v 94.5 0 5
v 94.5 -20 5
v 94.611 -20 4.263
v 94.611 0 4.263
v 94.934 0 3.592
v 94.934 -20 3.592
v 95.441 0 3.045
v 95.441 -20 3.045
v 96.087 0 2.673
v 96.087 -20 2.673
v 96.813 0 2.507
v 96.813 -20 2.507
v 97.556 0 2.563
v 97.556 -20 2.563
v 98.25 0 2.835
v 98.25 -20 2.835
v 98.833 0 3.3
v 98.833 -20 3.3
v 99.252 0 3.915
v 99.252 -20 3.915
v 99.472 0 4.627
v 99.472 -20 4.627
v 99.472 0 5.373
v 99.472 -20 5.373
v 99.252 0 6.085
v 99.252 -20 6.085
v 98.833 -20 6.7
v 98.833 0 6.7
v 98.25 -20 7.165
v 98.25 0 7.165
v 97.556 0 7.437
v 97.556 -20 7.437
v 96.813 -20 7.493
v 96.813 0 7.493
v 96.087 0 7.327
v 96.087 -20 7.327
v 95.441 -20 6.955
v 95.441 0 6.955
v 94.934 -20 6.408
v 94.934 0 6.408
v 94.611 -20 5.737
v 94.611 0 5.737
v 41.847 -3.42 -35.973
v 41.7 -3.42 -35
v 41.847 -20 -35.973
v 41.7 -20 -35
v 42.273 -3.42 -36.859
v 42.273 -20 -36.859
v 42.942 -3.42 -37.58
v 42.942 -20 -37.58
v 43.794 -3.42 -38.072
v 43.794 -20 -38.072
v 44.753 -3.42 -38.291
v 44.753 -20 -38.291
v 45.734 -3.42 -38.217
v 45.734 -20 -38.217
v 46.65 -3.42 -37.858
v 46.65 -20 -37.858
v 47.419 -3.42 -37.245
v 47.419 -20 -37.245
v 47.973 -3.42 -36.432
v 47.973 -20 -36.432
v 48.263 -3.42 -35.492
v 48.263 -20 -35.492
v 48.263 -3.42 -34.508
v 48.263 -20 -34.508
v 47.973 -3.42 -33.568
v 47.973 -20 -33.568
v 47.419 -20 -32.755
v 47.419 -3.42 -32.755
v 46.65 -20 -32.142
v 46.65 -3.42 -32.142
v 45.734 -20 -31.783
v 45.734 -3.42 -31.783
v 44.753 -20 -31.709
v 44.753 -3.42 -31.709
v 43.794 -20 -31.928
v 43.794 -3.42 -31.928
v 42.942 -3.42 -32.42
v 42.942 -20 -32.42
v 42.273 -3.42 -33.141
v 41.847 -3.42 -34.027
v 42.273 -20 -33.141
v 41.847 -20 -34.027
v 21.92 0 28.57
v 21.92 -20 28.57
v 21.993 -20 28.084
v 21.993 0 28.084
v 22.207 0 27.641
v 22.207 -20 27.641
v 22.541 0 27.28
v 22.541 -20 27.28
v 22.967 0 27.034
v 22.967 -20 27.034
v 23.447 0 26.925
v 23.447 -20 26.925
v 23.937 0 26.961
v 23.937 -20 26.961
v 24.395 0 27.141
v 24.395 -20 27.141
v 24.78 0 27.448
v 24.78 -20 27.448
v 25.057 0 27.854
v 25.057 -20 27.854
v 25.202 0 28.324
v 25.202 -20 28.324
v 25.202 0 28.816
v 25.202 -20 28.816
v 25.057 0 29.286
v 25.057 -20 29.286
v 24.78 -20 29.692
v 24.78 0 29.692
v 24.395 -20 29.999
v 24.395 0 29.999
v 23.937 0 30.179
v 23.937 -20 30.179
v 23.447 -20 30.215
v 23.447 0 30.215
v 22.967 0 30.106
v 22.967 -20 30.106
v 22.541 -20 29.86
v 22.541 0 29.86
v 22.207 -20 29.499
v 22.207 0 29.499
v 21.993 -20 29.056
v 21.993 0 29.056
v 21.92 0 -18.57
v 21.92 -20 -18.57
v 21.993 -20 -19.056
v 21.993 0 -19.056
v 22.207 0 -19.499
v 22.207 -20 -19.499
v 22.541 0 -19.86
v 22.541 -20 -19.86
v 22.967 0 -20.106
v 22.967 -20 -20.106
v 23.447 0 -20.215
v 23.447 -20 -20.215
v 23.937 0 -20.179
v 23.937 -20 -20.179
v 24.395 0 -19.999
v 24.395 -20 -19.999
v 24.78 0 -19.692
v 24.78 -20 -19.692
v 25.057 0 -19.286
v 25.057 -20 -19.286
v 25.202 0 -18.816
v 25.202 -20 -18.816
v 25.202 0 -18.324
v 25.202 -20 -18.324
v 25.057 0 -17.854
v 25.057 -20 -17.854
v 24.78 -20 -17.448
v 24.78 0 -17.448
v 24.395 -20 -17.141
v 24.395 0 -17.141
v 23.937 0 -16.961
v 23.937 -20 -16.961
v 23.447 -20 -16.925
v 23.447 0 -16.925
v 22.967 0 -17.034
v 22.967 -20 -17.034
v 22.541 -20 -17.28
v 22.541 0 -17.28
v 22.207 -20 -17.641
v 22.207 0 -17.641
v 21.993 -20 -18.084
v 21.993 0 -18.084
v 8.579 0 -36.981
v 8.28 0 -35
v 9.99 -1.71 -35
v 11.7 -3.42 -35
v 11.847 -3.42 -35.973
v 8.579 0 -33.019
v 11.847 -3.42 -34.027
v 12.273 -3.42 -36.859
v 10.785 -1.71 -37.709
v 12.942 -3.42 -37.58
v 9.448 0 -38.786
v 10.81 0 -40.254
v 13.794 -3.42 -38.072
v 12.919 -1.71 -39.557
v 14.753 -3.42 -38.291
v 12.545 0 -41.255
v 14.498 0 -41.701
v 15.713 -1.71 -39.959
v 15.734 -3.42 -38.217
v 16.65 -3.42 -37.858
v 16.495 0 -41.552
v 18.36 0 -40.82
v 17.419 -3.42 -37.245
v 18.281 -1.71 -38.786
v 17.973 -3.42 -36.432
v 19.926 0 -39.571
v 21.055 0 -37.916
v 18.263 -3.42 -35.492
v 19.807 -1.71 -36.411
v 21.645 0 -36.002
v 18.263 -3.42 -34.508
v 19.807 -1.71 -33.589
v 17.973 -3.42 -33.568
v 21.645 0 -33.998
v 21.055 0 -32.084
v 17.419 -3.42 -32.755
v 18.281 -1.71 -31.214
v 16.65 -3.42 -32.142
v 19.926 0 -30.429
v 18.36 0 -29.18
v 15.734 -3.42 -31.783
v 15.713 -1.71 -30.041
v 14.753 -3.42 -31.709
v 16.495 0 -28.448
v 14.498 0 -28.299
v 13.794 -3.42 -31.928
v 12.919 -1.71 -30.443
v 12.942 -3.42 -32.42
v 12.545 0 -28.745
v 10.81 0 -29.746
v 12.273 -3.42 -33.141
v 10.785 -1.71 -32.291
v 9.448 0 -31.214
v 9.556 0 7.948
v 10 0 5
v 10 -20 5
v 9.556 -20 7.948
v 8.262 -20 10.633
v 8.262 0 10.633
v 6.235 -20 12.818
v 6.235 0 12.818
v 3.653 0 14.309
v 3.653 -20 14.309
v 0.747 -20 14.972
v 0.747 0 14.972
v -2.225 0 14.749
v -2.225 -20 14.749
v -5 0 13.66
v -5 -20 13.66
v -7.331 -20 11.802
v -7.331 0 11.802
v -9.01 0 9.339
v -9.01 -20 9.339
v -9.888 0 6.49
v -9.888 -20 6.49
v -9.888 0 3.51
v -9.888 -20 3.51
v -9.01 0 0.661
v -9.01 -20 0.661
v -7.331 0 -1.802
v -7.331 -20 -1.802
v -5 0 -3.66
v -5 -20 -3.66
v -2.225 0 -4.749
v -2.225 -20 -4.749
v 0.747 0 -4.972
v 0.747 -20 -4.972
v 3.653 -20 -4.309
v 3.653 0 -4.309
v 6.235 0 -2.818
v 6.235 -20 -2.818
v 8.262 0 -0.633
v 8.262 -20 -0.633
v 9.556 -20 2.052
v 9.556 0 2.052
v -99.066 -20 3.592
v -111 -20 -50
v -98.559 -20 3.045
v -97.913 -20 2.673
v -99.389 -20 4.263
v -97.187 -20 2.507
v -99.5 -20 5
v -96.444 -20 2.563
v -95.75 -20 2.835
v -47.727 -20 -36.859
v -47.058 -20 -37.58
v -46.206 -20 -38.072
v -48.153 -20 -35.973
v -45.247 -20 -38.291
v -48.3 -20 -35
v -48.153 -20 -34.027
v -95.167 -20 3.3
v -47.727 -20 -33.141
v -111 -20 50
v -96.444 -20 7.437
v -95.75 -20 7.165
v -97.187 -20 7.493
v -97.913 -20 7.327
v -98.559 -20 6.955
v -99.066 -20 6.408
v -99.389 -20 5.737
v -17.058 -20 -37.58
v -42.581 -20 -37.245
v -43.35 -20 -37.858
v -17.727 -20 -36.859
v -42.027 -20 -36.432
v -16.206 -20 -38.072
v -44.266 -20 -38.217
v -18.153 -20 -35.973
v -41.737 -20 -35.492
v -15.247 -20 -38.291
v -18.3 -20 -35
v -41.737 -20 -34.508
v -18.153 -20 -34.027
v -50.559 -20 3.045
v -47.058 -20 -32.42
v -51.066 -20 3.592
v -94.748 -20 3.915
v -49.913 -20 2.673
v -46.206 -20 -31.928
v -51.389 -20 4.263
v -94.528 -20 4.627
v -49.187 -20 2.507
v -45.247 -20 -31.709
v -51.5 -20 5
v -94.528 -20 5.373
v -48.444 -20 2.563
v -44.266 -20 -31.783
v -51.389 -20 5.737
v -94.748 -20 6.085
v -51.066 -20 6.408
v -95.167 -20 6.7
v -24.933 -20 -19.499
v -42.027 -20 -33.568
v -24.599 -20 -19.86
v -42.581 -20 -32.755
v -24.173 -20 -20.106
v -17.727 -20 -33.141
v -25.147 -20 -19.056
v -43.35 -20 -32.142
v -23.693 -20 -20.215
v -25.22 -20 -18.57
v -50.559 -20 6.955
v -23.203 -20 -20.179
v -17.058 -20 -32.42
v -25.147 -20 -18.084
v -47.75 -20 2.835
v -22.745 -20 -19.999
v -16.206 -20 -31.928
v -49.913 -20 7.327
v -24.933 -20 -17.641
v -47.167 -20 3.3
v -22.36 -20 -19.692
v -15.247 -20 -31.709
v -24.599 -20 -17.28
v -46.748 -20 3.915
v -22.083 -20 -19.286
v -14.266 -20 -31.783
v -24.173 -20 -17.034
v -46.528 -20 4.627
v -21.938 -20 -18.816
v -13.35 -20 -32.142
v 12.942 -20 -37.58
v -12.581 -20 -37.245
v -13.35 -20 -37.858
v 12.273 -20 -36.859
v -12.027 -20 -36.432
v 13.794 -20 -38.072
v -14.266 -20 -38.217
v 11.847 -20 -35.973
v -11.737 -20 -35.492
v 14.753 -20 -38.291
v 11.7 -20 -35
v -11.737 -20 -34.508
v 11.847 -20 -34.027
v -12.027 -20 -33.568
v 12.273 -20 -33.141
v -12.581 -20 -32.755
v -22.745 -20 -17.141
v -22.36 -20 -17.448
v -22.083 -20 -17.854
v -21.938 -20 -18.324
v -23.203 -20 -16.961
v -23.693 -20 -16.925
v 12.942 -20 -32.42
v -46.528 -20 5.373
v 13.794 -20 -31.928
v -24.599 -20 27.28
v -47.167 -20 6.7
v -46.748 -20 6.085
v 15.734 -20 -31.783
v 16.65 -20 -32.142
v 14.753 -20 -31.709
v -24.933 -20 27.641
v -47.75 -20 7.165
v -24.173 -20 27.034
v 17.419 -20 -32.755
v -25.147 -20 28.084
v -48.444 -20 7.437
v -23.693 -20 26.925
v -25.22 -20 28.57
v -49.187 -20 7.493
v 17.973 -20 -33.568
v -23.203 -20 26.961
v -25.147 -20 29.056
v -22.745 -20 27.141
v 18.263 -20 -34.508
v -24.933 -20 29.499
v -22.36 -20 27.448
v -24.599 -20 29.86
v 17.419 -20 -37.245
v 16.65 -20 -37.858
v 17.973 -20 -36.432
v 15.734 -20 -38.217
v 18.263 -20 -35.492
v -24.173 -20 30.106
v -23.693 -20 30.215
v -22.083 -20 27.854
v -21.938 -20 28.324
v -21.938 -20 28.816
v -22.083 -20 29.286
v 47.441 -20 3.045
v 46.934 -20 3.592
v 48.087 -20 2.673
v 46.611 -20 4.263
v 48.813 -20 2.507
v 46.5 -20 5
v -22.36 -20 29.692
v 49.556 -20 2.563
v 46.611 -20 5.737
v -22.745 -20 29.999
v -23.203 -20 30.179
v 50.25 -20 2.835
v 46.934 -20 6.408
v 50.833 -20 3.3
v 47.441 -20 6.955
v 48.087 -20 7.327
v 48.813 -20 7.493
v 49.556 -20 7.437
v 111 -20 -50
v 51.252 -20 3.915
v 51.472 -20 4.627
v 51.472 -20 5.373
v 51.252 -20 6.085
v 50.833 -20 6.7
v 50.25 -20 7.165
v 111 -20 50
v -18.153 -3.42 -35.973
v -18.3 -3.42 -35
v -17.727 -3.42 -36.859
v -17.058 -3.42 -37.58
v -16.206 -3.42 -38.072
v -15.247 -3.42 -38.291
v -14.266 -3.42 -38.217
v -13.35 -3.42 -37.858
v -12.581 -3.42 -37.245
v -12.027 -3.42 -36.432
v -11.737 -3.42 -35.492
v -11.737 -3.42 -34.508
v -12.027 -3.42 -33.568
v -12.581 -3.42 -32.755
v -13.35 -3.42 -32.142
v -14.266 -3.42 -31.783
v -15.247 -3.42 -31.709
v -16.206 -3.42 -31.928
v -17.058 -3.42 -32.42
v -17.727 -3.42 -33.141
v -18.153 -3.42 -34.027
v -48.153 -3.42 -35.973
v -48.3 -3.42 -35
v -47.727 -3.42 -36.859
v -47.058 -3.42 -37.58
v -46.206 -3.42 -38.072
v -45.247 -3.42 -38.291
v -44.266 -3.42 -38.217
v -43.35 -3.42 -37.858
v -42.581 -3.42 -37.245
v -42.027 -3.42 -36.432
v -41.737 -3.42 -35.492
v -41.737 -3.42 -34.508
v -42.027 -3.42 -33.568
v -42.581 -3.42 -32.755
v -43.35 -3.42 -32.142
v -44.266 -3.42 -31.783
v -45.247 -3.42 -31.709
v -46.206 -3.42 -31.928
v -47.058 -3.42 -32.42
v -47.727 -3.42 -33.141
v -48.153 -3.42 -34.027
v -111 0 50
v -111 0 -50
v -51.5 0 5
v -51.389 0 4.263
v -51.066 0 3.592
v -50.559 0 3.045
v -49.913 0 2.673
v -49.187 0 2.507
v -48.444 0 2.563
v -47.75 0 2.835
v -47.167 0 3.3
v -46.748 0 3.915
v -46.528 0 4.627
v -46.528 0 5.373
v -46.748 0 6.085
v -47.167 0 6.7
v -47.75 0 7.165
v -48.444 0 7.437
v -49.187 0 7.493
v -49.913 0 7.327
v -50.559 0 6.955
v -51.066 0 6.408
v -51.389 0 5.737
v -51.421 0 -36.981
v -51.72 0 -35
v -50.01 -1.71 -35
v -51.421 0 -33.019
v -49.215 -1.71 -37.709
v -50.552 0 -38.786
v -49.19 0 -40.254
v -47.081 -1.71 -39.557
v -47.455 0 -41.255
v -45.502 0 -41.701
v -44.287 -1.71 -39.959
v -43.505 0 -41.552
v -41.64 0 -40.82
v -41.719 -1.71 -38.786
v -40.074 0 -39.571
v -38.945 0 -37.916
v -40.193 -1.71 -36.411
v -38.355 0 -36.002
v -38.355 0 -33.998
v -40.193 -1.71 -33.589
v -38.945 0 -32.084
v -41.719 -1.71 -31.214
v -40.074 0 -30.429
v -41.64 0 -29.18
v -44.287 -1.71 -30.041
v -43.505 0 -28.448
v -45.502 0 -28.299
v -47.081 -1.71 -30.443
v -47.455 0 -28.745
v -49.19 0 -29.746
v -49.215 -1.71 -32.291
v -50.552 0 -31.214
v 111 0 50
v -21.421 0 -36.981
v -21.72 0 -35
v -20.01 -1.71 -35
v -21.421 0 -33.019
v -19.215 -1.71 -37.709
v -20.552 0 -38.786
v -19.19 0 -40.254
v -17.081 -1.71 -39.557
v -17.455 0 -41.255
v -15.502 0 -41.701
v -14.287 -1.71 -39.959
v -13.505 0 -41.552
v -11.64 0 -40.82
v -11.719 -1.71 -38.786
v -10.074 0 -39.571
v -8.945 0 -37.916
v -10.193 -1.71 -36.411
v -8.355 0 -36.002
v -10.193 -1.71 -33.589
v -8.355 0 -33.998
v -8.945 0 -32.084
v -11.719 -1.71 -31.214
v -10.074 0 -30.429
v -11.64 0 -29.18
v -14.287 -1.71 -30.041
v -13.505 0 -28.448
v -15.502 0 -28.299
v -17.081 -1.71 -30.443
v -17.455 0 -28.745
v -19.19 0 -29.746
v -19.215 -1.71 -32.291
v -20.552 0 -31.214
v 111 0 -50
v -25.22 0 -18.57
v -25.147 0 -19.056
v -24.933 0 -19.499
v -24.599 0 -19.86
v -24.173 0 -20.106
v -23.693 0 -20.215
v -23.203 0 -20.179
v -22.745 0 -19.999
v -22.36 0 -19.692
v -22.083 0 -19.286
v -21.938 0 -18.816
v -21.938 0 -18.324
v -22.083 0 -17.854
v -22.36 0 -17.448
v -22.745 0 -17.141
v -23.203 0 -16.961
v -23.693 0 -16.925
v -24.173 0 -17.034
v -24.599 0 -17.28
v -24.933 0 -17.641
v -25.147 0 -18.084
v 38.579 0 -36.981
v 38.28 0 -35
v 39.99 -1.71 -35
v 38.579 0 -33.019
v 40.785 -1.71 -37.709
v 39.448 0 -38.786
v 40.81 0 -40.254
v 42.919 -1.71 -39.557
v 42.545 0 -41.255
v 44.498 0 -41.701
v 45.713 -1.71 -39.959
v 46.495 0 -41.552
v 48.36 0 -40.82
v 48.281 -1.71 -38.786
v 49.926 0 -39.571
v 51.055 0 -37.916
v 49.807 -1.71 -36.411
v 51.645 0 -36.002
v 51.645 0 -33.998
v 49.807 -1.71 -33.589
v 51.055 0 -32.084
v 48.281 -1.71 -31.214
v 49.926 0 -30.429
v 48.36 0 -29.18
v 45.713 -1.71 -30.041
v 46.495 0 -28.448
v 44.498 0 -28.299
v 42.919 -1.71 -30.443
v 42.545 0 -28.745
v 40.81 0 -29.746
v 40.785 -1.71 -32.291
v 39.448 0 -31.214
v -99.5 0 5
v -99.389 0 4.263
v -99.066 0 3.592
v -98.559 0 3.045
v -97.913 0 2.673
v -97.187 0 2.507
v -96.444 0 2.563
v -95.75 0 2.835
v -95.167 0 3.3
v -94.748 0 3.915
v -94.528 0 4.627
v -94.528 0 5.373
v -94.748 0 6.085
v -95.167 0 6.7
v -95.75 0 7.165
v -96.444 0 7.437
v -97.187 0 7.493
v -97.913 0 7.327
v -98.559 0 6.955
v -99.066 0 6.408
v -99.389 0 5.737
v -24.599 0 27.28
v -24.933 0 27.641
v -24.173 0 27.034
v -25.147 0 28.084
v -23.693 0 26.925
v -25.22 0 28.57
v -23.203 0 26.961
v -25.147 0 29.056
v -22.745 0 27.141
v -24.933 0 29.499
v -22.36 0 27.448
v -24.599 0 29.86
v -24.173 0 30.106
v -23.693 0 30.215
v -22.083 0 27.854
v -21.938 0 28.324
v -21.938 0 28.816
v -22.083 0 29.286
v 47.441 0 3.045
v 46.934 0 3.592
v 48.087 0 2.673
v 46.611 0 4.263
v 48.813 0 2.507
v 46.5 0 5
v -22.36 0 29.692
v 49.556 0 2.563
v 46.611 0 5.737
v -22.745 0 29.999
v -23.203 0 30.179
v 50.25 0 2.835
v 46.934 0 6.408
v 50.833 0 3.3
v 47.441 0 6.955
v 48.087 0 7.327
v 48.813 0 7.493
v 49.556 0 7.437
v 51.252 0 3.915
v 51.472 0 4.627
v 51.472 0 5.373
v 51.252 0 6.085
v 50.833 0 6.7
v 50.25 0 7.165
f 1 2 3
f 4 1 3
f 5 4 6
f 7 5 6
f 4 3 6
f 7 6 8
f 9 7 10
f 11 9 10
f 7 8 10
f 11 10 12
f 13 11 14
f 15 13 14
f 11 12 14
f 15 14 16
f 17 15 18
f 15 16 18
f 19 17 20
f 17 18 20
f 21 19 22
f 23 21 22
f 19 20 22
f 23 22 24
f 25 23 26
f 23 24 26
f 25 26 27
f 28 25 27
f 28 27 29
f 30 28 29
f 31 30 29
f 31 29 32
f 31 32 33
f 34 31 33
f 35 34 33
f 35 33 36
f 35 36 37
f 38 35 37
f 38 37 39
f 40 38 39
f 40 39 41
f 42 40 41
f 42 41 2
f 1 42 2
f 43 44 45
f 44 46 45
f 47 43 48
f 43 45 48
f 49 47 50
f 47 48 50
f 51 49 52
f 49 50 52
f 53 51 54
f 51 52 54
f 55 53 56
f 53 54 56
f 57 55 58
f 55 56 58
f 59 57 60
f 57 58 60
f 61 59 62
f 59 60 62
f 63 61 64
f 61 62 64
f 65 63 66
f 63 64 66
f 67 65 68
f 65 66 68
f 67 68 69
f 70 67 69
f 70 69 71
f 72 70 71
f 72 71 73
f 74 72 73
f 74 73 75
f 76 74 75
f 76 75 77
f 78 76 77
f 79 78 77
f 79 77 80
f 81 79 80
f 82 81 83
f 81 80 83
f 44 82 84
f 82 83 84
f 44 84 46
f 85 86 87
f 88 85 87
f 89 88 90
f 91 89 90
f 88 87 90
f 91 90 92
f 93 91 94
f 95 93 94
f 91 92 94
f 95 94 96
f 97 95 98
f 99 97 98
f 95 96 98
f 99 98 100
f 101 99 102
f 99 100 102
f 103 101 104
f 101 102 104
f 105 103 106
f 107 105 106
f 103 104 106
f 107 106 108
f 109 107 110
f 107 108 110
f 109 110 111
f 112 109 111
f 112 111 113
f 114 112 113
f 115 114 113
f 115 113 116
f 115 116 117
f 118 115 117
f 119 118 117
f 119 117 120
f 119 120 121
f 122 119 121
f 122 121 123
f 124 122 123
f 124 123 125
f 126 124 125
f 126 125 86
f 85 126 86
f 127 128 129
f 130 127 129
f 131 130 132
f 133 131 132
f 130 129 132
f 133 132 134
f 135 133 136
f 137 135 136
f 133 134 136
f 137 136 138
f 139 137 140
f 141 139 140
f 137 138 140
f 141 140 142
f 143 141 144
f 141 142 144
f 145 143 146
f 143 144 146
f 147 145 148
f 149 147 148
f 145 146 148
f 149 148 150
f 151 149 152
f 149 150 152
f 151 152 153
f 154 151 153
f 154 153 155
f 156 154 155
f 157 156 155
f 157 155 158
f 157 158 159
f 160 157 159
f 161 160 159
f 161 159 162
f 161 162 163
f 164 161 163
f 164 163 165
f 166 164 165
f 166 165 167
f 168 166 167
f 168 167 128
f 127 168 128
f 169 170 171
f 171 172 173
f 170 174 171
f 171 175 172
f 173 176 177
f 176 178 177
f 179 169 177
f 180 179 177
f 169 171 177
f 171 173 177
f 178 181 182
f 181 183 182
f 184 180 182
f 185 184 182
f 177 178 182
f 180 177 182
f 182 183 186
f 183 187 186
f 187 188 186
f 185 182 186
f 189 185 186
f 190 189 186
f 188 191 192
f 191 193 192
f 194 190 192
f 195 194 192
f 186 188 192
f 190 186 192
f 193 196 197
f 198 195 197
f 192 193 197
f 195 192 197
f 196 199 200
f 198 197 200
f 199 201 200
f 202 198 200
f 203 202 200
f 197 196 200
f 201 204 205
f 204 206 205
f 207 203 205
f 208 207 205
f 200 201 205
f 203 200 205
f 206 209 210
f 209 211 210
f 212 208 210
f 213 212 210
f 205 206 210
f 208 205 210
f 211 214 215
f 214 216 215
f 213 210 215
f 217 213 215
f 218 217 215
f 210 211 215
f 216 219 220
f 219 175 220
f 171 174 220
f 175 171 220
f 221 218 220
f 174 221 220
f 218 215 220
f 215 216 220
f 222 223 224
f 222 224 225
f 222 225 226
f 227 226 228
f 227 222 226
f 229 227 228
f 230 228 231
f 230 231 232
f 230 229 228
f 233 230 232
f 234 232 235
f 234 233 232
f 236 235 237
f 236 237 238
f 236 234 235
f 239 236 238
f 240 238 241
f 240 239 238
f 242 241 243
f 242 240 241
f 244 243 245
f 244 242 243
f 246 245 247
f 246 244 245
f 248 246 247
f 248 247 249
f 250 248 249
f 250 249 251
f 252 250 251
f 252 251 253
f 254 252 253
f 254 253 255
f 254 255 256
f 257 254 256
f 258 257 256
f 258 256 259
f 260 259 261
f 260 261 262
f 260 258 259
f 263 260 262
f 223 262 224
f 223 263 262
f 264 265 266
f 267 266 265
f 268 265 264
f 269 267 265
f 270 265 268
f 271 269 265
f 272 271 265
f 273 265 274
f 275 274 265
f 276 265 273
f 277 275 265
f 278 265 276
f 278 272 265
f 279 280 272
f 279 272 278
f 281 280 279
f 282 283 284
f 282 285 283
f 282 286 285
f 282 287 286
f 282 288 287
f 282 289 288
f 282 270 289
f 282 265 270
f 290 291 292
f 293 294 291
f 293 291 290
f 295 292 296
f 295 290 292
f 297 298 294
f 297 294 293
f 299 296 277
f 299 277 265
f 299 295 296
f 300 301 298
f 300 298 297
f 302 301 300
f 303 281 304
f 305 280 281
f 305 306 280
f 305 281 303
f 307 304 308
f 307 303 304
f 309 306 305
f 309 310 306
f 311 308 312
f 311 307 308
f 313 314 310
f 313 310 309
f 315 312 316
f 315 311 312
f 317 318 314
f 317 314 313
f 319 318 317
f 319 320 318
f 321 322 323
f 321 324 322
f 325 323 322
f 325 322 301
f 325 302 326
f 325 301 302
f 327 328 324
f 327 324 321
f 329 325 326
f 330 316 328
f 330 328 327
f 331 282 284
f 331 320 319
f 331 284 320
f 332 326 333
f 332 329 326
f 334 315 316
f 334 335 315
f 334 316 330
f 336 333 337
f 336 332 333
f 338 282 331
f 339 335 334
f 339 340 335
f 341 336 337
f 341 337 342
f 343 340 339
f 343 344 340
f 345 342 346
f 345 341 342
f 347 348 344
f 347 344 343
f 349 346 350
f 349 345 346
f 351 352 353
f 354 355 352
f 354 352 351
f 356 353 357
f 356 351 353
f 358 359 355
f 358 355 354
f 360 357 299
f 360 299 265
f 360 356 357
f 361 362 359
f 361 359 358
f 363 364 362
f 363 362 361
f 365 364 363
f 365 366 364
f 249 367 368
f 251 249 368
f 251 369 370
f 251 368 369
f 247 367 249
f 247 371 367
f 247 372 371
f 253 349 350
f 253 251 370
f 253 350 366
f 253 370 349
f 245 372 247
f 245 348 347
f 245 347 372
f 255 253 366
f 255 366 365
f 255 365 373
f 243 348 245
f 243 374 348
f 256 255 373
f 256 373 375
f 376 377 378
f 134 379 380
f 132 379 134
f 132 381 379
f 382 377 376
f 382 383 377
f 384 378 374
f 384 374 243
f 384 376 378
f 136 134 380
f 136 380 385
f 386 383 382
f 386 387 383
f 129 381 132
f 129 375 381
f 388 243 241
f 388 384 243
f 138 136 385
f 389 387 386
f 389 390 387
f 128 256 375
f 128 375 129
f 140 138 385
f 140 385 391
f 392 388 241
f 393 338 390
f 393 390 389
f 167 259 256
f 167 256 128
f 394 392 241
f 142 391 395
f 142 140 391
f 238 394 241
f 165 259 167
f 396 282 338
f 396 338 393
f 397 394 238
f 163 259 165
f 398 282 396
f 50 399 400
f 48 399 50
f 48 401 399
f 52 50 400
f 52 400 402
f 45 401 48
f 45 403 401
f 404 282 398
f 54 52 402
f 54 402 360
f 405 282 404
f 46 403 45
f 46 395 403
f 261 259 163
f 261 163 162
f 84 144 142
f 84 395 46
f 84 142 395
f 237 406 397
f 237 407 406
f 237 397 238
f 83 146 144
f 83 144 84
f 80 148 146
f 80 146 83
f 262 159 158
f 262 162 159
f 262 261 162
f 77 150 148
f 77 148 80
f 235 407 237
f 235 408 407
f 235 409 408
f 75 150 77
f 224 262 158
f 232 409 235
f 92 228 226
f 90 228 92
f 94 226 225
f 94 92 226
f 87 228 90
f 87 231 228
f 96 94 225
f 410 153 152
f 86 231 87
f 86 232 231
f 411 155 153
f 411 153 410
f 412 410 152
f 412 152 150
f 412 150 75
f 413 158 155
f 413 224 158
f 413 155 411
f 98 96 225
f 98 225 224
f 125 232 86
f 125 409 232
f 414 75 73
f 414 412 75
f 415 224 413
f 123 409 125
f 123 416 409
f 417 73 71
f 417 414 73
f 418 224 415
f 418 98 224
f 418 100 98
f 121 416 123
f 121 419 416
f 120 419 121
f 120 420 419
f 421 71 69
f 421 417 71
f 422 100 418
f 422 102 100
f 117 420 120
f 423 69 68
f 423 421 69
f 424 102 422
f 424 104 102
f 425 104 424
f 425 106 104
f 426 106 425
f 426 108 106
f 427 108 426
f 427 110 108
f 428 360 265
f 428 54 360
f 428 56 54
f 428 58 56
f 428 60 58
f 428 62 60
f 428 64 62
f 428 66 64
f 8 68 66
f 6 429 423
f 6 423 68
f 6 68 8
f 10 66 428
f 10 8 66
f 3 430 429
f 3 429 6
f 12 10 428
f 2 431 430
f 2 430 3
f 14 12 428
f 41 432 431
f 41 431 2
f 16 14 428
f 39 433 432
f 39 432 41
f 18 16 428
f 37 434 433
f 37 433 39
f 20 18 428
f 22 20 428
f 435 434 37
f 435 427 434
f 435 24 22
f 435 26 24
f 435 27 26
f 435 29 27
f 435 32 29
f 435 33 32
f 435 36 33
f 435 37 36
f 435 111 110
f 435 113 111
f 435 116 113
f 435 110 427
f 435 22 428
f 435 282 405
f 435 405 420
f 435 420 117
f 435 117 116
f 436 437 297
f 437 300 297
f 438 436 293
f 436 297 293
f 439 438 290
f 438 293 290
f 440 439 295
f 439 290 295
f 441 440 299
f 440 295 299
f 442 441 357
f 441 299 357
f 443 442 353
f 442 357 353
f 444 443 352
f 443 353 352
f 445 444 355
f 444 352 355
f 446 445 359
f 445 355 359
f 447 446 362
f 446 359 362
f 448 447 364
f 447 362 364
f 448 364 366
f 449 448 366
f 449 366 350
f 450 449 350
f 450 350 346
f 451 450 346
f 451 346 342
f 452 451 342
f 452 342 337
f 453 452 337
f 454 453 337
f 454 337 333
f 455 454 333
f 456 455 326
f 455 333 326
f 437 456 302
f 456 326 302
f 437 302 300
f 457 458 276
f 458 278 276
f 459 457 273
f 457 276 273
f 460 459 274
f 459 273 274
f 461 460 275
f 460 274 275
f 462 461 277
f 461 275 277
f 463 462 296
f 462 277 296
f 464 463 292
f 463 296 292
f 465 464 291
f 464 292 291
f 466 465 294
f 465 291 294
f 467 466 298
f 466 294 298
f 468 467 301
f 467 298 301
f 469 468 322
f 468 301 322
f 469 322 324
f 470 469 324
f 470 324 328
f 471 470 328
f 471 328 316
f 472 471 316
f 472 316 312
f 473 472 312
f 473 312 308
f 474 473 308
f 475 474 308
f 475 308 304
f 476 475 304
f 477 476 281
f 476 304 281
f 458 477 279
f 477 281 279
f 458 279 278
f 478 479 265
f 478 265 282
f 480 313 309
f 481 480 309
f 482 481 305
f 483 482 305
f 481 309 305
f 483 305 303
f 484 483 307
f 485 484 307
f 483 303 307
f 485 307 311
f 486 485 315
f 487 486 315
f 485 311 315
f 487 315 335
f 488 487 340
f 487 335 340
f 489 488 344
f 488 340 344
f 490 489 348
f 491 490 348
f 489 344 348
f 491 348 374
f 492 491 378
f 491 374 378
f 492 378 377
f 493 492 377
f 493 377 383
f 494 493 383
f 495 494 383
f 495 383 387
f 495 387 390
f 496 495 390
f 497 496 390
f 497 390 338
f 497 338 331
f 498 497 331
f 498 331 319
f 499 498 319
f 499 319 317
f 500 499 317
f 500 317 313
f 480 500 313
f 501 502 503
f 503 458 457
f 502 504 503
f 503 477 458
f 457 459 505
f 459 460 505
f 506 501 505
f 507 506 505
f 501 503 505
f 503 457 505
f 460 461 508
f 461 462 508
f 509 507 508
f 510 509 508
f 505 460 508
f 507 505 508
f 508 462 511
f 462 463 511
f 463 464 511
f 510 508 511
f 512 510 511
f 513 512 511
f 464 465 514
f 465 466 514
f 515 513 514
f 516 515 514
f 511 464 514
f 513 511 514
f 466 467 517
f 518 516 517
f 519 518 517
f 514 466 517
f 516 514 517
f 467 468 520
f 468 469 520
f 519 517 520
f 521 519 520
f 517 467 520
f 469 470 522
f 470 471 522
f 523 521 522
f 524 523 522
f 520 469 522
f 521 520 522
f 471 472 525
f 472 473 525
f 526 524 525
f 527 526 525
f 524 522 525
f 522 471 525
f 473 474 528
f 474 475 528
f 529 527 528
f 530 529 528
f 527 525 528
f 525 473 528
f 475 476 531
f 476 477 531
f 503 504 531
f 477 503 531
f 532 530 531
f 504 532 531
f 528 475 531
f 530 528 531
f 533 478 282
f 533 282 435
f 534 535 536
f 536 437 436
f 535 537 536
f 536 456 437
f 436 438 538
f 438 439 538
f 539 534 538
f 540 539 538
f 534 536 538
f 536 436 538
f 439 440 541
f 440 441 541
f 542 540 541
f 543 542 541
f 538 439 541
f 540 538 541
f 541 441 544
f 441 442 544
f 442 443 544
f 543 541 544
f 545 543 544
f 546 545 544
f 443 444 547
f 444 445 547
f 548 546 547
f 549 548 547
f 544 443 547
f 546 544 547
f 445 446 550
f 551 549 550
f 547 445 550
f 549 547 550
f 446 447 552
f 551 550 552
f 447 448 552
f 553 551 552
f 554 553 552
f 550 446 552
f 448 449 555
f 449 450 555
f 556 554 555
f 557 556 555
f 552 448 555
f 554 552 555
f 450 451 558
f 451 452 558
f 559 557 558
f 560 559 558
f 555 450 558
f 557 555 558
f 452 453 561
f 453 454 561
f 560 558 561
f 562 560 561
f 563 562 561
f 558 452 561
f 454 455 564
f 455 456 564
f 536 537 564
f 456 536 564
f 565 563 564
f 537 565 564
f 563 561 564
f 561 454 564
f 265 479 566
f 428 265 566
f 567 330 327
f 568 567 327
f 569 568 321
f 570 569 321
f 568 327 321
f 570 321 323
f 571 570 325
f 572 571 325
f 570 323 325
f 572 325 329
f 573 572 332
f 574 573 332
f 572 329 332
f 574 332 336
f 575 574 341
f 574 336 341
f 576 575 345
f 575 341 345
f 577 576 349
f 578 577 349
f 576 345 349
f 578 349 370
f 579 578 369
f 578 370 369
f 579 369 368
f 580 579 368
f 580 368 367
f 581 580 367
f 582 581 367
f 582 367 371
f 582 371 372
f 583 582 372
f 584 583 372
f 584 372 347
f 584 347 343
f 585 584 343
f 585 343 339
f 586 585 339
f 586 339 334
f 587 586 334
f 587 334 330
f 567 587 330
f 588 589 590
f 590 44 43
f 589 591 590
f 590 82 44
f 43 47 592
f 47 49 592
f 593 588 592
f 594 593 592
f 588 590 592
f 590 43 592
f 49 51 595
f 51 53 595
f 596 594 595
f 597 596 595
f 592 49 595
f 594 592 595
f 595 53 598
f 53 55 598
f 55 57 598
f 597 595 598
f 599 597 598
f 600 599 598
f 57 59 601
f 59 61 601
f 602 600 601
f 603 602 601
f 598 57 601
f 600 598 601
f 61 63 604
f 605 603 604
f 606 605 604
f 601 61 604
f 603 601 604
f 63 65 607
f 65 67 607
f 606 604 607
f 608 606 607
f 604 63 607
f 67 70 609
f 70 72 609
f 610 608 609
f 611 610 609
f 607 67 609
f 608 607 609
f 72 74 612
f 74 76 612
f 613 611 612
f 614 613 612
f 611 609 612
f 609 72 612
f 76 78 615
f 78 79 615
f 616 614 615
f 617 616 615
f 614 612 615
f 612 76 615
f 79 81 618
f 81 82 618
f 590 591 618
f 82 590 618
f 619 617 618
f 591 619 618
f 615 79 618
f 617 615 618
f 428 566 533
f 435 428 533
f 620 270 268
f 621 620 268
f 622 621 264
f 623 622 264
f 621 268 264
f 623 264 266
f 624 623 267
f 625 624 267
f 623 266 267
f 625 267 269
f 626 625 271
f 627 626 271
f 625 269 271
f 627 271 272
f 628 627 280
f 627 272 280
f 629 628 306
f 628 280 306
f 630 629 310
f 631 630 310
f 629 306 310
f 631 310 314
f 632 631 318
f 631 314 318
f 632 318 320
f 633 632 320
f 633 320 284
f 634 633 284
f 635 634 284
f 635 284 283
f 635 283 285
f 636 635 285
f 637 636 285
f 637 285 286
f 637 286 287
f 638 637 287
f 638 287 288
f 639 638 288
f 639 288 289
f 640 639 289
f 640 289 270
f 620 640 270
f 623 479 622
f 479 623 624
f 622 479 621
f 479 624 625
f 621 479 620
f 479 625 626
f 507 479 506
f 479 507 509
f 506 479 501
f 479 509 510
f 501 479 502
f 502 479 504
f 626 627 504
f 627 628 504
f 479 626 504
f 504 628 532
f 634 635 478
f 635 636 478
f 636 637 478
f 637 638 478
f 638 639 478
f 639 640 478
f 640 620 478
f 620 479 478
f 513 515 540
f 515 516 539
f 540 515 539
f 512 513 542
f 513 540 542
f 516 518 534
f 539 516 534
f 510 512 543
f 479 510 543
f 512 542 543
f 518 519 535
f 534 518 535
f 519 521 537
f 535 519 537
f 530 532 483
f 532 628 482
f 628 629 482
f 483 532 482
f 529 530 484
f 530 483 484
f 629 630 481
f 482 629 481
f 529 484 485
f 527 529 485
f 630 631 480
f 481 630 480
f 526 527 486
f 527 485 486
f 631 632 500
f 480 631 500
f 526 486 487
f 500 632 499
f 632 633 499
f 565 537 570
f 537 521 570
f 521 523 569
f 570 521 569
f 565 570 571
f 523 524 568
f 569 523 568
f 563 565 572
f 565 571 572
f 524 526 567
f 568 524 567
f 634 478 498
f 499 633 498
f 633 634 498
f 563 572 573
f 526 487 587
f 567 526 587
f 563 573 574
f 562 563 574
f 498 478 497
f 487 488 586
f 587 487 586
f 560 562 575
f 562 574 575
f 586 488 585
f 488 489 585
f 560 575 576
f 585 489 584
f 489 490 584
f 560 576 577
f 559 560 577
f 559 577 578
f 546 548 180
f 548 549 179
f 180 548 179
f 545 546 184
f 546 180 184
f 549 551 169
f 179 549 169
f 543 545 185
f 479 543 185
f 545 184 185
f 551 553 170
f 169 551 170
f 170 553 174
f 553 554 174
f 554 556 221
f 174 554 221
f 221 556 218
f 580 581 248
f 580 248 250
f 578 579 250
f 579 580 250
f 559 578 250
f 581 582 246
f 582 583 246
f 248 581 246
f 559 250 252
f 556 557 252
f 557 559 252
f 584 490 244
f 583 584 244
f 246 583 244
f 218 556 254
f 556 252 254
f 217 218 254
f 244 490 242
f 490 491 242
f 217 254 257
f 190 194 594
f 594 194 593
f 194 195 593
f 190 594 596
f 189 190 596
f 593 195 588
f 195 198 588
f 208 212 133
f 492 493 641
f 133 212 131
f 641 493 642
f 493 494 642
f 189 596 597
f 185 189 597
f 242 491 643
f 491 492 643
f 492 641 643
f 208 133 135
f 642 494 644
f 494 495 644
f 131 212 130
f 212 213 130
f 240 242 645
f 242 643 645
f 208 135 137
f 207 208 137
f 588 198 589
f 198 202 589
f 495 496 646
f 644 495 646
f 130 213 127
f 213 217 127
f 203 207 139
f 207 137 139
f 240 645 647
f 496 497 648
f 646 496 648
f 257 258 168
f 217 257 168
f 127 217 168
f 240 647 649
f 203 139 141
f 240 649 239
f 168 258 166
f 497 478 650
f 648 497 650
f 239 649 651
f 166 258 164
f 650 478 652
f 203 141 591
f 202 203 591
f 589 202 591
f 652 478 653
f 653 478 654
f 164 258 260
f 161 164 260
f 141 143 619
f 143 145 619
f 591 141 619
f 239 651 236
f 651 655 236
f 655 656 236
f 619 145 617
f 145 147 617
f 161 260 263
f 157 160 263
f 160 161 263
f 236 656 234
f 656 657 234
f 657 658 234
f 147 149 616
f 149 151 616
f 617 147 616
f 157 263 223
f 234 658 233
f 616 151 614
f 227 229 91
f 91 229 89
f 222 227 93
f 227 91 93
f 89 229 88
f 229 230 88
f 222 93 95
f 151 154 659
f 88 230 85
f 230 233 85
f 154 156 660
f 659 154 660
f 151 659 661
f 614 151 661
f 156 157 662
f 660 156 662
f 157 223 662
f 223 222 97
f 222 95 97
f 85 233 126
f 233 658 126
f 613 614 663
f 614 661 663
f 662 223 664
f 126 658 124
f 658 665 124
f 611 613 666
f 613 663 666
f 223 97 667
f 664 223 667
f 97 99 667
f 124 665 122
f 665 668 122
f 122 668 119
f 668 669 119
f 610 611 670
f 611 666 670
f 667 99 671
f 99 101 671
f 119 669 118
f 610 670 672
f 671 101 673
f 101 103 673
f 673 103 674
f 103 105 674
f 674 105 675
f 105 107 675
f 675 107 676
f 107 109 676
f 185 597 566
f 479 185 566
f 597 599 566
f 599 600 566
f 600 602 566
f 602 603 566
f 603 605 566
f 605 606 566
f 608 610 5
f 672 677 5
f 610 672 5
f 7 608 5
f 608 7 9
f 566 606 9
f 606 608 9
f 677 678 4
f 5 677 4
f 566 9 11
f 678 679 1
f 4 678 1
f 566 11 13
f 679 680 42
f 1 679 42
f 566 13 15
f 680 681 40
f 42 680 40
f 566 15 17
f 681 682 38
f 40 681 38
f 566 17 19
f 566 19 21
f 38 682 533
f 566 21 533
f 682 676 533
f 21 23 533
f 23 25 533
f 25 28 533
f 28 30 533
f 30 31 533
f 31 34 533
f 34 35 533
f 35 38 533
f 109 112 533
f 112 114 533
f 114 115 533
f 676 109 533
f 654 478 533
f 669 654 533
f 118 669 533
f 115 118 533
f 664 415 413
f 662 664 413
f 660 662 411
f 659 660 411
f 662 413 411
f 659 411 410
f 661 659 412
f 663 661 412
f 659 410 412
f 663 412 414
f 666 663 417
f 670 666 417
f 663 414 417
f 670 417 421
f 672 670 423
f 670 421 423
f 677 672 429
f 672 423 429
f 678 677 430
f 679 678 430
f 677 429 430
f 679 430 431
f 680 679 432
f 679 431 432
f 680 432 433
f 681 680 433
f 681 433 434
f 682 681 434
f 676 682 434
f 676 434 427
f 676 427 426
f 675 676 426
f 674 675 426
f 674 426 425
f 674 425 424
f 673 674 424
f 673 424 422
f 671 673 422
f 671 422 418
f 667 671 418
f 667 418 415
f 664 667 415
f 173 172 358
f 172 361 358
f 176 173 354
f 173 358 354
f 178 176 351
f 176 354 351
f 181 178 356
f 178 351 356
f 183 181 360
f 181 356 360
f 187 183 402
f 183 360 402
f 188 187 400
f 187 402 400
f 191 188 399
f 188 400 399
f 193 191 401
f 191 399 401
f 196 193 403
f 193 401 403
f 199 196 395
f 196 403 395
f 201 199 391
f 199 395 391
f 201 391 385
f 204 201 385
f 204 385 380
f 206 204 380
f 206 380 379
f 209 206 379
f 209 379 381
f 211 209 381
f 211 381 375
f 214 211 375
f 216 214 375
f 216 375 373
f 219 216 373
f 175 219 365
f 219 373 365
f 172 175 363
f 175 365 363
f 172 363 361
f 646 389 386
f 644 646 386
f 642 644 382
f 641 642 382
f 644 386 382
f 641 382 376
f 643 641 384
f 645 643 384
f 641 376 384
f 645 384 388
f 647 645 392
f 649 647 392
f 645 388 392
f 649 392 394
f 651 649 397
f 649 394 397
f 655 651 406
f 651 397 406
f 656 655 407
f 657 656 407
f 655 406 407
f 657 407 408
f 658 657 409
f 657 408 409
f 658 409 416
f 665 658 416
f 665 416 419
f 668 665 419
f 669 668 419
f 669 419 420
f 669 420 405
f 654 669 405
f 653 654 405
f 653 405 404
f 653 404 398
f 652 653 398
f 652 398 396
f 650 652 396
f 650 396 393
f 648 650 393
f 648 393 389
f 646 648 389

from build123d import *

# Parameters (mm, degrees)
F0_W           = 222
F0_H           = 100
F0_R           = 10
F1_DEPTH       = 20
F2_D           = 5
F3_D           = 6.6
F3_CSINK_D     = 13.44
F3_CSINK_ANGLE = 90
F4_D           = 3.3


with BuildPart() as f1:
    # F0 (on Front) → F1 (new body)
    with BuildSketch(Plane.XZ):
        Rectangle(F0_W, F0_H)
        with Locations((0, 5)):
            Circle(F0_R, mode=Mode.SUBTRACT)
    extrude(amount=F1_DEPTH)

    # F2 (through all)
    with Locations(Plane(origin=(0, 0, 0), x_dir=(1, 0, 0), z_dir=(0, 1, 0))):
        with Locations((49, -5), (97, -5), (-49, -5), (-97, -5)):
            Hole(F2_D / 2)

    # F3 (through all)
    with Locations(Plane(origin=(0, 0, 0), x_dir=(1, 0, 0), z_dir=(0, 1, 0))):
        with Locations((-45, 35), (-15, 35), (15, 35), (45, 35)):
            CounterSinkHole(F3_D / 2, F3_CSINK_D / 2, counter_sink_angle=F3_CSINK_ANGLE)

    # F4 (through all)
    with Locations(Plane(origin=(0, 0, 0), x_dir=(1, 0, 0), z_dir=(0, 1, 0))):
        with Locations((23.57, -28.57), (-23.57, -28.57), (23.57, 18.57), (-23.57, 18.57)):
            Hole(F4_D / 2)


solid = f1.part
